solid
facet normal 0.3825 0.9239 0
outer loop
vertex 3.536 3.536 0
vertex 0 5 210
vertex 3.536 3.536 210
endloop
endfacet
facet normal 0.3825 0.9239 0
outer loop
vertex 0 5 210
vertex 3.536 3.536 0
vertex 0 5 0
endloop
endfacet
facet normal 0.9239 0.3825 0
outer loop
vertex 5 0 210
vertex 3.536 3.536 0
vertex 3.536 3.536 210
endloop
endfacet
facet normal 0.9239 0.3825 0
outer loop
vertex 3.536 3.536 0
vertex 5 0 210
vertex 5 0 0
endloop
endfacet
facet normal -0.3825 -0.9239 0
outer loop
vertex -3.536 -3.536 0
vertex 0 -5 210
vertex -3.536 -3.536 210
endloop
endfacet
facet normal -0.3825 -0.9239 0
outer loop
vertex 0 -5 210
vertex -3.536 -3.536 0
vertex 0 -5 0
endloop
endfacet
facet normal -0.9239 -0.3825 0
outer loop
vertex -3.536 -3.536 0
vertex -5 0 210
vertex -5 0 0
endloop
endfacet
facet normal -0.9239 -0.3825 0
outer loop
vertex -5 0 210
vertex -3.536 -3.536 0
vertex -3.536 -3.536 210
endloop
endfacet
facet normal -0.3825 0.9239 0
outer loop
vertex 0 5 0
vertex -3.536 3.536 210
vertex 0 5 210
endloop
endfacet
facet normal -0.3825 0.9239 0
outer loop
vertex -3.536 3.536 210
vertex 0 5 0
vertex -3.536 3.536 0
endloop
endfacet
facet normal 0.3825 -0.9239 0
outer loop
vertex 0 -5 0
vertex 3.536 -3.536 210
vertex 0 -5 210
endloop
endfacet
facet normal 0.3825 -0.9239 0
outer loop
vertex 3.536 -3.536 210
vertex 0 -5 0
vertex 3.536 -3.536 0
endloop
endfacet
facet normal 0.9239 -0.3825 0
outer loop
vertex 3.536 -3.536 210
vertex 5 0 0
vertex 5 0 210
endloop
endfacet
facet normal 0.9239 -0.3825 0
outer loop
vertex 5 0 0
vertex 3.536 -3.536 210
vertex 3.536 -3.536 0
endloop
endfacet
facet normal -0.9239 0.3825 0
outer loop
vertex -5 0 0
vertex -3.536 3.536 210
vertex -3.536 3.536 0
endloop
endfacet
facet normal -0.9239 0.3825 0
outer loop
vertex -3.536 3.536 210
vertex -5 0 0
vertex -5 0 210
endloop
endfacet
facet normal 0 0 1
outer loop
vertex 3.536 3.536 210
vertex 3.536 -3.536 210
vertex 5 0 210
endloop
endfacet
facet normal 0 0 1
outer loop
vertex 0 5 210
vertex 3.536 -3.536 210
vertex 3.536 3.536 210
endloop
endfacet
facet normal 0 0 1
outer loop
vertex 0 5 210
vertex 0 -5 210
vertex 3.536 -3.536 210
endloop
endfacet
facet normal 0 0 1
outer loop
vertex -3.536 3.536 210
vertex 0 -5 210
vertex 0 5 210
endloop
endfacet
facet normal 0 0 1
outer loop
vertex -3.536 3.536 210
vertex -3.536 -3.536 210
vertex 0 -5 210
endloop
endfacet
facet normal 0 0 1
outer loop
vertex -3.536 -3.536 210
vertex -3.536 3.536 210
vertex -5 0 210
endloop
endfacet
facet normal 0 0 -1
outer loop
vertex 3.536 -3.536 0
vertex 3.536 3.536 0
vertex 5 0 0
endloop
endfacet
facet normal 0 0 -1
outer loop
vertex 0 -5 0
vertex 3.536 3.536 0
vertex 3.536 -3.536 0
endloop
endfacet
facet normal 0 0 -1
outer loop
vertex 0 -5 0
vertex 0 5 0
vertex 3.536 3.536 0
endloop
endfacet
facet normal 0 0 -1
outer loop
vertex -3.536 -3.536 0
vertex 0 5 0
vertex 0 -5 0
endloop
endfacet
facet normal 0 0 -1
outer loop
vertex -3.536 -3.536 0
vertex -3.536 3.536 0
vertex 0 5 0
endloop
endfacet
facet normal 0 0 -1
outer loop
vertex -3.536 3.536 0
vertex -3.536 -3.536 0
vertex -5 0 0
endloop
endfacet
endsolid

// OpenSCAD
module r_tree(
    h_increment,
    main_depth,
) {
    linear_extrude( height = h_increment )
    children(0);
    
    if (main_depth > 0) {
        
        translate( [ 0, 0, h_increment] )
         r_tree(
            h_increment,
            main_depth - 1
            ) {
                children(0);
            }
    }
}

r_tree(
    h_increment = 10,
    main_depth = 20
) {
    circle( d= 10, $fn = 8);
}
